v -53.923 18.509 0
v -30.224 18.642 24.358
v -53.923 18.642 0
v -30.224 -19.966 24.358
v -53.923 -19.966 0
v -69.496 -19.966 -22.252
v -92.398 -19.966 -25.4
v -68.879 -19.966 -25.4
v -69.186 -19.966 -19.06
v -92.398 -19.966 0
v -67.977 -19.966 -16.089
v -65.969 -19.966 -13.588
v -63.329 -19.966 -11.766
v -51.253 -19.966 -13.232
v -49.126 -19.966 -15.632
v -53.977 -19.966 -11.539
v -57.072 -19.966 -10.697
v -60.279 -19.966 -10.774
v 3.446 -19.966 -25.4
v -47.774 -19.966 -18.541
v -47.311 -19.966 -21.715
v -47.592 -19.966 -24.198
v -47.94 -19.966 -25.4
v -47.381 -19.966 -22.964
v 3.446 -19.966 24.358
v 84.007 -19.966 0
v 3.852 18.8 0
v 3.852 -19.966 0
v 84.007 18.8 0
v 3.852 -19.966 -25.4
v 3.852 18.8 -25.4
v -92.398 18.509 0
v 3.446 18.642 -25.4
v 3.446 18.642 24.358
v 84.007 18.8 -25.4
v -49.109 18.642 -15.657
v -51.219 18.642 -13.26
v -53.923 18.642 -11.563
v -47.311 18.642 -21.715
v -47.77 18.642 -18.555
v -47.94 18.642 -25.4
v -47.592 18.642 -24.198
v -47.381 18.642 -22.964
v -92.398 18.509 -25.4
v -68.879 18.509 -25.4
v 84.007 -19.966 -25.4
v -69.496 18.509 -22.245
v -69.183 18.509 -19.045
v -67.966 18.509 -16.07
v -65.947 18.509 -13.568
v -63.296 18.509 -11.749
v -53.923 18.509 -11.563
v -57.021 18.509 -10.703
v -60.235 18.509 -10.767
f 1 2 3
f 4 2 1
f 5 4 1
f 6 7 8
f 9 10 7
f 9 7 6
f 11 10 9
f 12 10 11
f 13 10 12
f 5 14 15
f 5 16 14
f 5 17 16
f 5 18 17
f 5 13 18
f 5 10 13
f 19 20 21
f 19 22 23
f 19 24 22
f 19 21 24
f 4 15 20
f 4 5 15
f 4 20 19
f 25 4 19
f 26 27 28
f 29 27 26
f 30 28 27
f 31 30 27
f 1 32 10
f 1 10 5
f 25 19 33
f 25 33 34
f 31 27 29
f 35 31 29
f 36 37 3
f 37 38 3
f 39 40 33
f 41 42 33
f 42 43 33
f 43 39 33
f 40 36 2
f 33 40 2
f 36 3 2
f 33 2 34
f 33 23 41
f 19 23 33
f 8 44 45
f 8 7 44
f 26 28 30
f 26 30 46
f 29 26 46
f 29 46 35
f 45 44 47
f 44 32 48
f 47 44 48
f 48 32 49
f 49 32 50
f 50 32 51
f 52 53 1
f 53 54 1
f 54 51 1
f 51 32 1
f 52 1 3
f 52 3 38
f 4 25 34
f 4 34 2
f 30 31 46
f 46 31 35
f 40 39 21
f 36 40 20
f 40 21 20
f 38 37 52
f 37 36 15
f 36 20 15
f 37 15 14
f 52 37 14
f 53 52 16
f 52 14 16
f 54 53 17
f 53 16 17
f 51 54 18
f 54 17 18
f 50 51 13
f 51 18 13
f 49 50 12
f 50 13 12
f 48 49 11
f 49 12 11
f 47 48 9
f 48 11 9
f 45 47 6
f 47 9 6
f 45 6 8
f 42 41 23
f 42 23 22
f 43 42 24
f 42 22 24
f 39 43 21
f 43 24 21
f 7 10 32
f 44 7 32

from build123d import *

# Parameters (mm, degrees)
F0_W          = 38.4747609496
F0_H          = 38.4747553617
F1_DEPTH      = 25.4
F3_DEPTH      = 38.608
F4_W          = 80.1557321101
F4_H          = 38.7662295252
F5_DEPTH      = 25.4
F7_DEPTH      = 210
F7_DEPTH_BACK = 127


# Not quite as in the source:
# - an extrude ends at something that could not be found from the text; its depth is read off the source's solid


with BuildPart() as f1:
    # F0 (on Top) → F1 (new body)
    with BuildSketch(Plane.XY):
        with Locations((-73.1603316963, -0.7286882028)):
            Rectangle(F0_W, F0_H)
    extrude(amount=-F1_DEPTH)

    # F2 (on face) → F3 (join)
    with BuildSketch(Plane.XZ.offset(19.9660658836)):
        Polygon((-53.9229512215, 0), (-53.9229512215, -25.4), (3.4455996938, -25.4), (3.4455996938, 24.3583643333), (-30.2235017333, 24.3583643333), align=None)
    extrude(amount=-F3_DEPTH)

    # F6 (on face) → F7 (cut, two sides)
    with BuildSketch(Plane.XZ.offset(19.9660658836)) as f7_sk:
        with BuildLine():
            ThreePointArc((-47.9401604074, -25.4), (-47.4690815305, -23.5841579821), (-47.3105455809, -21.7149164528))
            ThreePointArc((-47.3105455809, -21.7149164528), (-60.278839254, -10.7744002586), (-68.8790350419, -25.4))
            Line((-68.8790350419, -25.4), (-47.9401604074, -25.4))
        make_face()
    extrude(amount=F7_DEPTH, mode=Mode.SUBTRACT)
    extrude(f7_sk.sketch, amount=-F7_DEPTH_BACK, mode=Mode.SUBTRACT)


with BuildPart() as f5:
    # F4 (on Top) → F5 (new body)
    with BuildSketch(Plane.XY):
        with Locations((43.9295014367, -0.582951121)):
            Rectangle(F4_W, F4_H)
    extrude(amount=-F5_DEPTH)


solid = Compound([f1.part, f5.part])
